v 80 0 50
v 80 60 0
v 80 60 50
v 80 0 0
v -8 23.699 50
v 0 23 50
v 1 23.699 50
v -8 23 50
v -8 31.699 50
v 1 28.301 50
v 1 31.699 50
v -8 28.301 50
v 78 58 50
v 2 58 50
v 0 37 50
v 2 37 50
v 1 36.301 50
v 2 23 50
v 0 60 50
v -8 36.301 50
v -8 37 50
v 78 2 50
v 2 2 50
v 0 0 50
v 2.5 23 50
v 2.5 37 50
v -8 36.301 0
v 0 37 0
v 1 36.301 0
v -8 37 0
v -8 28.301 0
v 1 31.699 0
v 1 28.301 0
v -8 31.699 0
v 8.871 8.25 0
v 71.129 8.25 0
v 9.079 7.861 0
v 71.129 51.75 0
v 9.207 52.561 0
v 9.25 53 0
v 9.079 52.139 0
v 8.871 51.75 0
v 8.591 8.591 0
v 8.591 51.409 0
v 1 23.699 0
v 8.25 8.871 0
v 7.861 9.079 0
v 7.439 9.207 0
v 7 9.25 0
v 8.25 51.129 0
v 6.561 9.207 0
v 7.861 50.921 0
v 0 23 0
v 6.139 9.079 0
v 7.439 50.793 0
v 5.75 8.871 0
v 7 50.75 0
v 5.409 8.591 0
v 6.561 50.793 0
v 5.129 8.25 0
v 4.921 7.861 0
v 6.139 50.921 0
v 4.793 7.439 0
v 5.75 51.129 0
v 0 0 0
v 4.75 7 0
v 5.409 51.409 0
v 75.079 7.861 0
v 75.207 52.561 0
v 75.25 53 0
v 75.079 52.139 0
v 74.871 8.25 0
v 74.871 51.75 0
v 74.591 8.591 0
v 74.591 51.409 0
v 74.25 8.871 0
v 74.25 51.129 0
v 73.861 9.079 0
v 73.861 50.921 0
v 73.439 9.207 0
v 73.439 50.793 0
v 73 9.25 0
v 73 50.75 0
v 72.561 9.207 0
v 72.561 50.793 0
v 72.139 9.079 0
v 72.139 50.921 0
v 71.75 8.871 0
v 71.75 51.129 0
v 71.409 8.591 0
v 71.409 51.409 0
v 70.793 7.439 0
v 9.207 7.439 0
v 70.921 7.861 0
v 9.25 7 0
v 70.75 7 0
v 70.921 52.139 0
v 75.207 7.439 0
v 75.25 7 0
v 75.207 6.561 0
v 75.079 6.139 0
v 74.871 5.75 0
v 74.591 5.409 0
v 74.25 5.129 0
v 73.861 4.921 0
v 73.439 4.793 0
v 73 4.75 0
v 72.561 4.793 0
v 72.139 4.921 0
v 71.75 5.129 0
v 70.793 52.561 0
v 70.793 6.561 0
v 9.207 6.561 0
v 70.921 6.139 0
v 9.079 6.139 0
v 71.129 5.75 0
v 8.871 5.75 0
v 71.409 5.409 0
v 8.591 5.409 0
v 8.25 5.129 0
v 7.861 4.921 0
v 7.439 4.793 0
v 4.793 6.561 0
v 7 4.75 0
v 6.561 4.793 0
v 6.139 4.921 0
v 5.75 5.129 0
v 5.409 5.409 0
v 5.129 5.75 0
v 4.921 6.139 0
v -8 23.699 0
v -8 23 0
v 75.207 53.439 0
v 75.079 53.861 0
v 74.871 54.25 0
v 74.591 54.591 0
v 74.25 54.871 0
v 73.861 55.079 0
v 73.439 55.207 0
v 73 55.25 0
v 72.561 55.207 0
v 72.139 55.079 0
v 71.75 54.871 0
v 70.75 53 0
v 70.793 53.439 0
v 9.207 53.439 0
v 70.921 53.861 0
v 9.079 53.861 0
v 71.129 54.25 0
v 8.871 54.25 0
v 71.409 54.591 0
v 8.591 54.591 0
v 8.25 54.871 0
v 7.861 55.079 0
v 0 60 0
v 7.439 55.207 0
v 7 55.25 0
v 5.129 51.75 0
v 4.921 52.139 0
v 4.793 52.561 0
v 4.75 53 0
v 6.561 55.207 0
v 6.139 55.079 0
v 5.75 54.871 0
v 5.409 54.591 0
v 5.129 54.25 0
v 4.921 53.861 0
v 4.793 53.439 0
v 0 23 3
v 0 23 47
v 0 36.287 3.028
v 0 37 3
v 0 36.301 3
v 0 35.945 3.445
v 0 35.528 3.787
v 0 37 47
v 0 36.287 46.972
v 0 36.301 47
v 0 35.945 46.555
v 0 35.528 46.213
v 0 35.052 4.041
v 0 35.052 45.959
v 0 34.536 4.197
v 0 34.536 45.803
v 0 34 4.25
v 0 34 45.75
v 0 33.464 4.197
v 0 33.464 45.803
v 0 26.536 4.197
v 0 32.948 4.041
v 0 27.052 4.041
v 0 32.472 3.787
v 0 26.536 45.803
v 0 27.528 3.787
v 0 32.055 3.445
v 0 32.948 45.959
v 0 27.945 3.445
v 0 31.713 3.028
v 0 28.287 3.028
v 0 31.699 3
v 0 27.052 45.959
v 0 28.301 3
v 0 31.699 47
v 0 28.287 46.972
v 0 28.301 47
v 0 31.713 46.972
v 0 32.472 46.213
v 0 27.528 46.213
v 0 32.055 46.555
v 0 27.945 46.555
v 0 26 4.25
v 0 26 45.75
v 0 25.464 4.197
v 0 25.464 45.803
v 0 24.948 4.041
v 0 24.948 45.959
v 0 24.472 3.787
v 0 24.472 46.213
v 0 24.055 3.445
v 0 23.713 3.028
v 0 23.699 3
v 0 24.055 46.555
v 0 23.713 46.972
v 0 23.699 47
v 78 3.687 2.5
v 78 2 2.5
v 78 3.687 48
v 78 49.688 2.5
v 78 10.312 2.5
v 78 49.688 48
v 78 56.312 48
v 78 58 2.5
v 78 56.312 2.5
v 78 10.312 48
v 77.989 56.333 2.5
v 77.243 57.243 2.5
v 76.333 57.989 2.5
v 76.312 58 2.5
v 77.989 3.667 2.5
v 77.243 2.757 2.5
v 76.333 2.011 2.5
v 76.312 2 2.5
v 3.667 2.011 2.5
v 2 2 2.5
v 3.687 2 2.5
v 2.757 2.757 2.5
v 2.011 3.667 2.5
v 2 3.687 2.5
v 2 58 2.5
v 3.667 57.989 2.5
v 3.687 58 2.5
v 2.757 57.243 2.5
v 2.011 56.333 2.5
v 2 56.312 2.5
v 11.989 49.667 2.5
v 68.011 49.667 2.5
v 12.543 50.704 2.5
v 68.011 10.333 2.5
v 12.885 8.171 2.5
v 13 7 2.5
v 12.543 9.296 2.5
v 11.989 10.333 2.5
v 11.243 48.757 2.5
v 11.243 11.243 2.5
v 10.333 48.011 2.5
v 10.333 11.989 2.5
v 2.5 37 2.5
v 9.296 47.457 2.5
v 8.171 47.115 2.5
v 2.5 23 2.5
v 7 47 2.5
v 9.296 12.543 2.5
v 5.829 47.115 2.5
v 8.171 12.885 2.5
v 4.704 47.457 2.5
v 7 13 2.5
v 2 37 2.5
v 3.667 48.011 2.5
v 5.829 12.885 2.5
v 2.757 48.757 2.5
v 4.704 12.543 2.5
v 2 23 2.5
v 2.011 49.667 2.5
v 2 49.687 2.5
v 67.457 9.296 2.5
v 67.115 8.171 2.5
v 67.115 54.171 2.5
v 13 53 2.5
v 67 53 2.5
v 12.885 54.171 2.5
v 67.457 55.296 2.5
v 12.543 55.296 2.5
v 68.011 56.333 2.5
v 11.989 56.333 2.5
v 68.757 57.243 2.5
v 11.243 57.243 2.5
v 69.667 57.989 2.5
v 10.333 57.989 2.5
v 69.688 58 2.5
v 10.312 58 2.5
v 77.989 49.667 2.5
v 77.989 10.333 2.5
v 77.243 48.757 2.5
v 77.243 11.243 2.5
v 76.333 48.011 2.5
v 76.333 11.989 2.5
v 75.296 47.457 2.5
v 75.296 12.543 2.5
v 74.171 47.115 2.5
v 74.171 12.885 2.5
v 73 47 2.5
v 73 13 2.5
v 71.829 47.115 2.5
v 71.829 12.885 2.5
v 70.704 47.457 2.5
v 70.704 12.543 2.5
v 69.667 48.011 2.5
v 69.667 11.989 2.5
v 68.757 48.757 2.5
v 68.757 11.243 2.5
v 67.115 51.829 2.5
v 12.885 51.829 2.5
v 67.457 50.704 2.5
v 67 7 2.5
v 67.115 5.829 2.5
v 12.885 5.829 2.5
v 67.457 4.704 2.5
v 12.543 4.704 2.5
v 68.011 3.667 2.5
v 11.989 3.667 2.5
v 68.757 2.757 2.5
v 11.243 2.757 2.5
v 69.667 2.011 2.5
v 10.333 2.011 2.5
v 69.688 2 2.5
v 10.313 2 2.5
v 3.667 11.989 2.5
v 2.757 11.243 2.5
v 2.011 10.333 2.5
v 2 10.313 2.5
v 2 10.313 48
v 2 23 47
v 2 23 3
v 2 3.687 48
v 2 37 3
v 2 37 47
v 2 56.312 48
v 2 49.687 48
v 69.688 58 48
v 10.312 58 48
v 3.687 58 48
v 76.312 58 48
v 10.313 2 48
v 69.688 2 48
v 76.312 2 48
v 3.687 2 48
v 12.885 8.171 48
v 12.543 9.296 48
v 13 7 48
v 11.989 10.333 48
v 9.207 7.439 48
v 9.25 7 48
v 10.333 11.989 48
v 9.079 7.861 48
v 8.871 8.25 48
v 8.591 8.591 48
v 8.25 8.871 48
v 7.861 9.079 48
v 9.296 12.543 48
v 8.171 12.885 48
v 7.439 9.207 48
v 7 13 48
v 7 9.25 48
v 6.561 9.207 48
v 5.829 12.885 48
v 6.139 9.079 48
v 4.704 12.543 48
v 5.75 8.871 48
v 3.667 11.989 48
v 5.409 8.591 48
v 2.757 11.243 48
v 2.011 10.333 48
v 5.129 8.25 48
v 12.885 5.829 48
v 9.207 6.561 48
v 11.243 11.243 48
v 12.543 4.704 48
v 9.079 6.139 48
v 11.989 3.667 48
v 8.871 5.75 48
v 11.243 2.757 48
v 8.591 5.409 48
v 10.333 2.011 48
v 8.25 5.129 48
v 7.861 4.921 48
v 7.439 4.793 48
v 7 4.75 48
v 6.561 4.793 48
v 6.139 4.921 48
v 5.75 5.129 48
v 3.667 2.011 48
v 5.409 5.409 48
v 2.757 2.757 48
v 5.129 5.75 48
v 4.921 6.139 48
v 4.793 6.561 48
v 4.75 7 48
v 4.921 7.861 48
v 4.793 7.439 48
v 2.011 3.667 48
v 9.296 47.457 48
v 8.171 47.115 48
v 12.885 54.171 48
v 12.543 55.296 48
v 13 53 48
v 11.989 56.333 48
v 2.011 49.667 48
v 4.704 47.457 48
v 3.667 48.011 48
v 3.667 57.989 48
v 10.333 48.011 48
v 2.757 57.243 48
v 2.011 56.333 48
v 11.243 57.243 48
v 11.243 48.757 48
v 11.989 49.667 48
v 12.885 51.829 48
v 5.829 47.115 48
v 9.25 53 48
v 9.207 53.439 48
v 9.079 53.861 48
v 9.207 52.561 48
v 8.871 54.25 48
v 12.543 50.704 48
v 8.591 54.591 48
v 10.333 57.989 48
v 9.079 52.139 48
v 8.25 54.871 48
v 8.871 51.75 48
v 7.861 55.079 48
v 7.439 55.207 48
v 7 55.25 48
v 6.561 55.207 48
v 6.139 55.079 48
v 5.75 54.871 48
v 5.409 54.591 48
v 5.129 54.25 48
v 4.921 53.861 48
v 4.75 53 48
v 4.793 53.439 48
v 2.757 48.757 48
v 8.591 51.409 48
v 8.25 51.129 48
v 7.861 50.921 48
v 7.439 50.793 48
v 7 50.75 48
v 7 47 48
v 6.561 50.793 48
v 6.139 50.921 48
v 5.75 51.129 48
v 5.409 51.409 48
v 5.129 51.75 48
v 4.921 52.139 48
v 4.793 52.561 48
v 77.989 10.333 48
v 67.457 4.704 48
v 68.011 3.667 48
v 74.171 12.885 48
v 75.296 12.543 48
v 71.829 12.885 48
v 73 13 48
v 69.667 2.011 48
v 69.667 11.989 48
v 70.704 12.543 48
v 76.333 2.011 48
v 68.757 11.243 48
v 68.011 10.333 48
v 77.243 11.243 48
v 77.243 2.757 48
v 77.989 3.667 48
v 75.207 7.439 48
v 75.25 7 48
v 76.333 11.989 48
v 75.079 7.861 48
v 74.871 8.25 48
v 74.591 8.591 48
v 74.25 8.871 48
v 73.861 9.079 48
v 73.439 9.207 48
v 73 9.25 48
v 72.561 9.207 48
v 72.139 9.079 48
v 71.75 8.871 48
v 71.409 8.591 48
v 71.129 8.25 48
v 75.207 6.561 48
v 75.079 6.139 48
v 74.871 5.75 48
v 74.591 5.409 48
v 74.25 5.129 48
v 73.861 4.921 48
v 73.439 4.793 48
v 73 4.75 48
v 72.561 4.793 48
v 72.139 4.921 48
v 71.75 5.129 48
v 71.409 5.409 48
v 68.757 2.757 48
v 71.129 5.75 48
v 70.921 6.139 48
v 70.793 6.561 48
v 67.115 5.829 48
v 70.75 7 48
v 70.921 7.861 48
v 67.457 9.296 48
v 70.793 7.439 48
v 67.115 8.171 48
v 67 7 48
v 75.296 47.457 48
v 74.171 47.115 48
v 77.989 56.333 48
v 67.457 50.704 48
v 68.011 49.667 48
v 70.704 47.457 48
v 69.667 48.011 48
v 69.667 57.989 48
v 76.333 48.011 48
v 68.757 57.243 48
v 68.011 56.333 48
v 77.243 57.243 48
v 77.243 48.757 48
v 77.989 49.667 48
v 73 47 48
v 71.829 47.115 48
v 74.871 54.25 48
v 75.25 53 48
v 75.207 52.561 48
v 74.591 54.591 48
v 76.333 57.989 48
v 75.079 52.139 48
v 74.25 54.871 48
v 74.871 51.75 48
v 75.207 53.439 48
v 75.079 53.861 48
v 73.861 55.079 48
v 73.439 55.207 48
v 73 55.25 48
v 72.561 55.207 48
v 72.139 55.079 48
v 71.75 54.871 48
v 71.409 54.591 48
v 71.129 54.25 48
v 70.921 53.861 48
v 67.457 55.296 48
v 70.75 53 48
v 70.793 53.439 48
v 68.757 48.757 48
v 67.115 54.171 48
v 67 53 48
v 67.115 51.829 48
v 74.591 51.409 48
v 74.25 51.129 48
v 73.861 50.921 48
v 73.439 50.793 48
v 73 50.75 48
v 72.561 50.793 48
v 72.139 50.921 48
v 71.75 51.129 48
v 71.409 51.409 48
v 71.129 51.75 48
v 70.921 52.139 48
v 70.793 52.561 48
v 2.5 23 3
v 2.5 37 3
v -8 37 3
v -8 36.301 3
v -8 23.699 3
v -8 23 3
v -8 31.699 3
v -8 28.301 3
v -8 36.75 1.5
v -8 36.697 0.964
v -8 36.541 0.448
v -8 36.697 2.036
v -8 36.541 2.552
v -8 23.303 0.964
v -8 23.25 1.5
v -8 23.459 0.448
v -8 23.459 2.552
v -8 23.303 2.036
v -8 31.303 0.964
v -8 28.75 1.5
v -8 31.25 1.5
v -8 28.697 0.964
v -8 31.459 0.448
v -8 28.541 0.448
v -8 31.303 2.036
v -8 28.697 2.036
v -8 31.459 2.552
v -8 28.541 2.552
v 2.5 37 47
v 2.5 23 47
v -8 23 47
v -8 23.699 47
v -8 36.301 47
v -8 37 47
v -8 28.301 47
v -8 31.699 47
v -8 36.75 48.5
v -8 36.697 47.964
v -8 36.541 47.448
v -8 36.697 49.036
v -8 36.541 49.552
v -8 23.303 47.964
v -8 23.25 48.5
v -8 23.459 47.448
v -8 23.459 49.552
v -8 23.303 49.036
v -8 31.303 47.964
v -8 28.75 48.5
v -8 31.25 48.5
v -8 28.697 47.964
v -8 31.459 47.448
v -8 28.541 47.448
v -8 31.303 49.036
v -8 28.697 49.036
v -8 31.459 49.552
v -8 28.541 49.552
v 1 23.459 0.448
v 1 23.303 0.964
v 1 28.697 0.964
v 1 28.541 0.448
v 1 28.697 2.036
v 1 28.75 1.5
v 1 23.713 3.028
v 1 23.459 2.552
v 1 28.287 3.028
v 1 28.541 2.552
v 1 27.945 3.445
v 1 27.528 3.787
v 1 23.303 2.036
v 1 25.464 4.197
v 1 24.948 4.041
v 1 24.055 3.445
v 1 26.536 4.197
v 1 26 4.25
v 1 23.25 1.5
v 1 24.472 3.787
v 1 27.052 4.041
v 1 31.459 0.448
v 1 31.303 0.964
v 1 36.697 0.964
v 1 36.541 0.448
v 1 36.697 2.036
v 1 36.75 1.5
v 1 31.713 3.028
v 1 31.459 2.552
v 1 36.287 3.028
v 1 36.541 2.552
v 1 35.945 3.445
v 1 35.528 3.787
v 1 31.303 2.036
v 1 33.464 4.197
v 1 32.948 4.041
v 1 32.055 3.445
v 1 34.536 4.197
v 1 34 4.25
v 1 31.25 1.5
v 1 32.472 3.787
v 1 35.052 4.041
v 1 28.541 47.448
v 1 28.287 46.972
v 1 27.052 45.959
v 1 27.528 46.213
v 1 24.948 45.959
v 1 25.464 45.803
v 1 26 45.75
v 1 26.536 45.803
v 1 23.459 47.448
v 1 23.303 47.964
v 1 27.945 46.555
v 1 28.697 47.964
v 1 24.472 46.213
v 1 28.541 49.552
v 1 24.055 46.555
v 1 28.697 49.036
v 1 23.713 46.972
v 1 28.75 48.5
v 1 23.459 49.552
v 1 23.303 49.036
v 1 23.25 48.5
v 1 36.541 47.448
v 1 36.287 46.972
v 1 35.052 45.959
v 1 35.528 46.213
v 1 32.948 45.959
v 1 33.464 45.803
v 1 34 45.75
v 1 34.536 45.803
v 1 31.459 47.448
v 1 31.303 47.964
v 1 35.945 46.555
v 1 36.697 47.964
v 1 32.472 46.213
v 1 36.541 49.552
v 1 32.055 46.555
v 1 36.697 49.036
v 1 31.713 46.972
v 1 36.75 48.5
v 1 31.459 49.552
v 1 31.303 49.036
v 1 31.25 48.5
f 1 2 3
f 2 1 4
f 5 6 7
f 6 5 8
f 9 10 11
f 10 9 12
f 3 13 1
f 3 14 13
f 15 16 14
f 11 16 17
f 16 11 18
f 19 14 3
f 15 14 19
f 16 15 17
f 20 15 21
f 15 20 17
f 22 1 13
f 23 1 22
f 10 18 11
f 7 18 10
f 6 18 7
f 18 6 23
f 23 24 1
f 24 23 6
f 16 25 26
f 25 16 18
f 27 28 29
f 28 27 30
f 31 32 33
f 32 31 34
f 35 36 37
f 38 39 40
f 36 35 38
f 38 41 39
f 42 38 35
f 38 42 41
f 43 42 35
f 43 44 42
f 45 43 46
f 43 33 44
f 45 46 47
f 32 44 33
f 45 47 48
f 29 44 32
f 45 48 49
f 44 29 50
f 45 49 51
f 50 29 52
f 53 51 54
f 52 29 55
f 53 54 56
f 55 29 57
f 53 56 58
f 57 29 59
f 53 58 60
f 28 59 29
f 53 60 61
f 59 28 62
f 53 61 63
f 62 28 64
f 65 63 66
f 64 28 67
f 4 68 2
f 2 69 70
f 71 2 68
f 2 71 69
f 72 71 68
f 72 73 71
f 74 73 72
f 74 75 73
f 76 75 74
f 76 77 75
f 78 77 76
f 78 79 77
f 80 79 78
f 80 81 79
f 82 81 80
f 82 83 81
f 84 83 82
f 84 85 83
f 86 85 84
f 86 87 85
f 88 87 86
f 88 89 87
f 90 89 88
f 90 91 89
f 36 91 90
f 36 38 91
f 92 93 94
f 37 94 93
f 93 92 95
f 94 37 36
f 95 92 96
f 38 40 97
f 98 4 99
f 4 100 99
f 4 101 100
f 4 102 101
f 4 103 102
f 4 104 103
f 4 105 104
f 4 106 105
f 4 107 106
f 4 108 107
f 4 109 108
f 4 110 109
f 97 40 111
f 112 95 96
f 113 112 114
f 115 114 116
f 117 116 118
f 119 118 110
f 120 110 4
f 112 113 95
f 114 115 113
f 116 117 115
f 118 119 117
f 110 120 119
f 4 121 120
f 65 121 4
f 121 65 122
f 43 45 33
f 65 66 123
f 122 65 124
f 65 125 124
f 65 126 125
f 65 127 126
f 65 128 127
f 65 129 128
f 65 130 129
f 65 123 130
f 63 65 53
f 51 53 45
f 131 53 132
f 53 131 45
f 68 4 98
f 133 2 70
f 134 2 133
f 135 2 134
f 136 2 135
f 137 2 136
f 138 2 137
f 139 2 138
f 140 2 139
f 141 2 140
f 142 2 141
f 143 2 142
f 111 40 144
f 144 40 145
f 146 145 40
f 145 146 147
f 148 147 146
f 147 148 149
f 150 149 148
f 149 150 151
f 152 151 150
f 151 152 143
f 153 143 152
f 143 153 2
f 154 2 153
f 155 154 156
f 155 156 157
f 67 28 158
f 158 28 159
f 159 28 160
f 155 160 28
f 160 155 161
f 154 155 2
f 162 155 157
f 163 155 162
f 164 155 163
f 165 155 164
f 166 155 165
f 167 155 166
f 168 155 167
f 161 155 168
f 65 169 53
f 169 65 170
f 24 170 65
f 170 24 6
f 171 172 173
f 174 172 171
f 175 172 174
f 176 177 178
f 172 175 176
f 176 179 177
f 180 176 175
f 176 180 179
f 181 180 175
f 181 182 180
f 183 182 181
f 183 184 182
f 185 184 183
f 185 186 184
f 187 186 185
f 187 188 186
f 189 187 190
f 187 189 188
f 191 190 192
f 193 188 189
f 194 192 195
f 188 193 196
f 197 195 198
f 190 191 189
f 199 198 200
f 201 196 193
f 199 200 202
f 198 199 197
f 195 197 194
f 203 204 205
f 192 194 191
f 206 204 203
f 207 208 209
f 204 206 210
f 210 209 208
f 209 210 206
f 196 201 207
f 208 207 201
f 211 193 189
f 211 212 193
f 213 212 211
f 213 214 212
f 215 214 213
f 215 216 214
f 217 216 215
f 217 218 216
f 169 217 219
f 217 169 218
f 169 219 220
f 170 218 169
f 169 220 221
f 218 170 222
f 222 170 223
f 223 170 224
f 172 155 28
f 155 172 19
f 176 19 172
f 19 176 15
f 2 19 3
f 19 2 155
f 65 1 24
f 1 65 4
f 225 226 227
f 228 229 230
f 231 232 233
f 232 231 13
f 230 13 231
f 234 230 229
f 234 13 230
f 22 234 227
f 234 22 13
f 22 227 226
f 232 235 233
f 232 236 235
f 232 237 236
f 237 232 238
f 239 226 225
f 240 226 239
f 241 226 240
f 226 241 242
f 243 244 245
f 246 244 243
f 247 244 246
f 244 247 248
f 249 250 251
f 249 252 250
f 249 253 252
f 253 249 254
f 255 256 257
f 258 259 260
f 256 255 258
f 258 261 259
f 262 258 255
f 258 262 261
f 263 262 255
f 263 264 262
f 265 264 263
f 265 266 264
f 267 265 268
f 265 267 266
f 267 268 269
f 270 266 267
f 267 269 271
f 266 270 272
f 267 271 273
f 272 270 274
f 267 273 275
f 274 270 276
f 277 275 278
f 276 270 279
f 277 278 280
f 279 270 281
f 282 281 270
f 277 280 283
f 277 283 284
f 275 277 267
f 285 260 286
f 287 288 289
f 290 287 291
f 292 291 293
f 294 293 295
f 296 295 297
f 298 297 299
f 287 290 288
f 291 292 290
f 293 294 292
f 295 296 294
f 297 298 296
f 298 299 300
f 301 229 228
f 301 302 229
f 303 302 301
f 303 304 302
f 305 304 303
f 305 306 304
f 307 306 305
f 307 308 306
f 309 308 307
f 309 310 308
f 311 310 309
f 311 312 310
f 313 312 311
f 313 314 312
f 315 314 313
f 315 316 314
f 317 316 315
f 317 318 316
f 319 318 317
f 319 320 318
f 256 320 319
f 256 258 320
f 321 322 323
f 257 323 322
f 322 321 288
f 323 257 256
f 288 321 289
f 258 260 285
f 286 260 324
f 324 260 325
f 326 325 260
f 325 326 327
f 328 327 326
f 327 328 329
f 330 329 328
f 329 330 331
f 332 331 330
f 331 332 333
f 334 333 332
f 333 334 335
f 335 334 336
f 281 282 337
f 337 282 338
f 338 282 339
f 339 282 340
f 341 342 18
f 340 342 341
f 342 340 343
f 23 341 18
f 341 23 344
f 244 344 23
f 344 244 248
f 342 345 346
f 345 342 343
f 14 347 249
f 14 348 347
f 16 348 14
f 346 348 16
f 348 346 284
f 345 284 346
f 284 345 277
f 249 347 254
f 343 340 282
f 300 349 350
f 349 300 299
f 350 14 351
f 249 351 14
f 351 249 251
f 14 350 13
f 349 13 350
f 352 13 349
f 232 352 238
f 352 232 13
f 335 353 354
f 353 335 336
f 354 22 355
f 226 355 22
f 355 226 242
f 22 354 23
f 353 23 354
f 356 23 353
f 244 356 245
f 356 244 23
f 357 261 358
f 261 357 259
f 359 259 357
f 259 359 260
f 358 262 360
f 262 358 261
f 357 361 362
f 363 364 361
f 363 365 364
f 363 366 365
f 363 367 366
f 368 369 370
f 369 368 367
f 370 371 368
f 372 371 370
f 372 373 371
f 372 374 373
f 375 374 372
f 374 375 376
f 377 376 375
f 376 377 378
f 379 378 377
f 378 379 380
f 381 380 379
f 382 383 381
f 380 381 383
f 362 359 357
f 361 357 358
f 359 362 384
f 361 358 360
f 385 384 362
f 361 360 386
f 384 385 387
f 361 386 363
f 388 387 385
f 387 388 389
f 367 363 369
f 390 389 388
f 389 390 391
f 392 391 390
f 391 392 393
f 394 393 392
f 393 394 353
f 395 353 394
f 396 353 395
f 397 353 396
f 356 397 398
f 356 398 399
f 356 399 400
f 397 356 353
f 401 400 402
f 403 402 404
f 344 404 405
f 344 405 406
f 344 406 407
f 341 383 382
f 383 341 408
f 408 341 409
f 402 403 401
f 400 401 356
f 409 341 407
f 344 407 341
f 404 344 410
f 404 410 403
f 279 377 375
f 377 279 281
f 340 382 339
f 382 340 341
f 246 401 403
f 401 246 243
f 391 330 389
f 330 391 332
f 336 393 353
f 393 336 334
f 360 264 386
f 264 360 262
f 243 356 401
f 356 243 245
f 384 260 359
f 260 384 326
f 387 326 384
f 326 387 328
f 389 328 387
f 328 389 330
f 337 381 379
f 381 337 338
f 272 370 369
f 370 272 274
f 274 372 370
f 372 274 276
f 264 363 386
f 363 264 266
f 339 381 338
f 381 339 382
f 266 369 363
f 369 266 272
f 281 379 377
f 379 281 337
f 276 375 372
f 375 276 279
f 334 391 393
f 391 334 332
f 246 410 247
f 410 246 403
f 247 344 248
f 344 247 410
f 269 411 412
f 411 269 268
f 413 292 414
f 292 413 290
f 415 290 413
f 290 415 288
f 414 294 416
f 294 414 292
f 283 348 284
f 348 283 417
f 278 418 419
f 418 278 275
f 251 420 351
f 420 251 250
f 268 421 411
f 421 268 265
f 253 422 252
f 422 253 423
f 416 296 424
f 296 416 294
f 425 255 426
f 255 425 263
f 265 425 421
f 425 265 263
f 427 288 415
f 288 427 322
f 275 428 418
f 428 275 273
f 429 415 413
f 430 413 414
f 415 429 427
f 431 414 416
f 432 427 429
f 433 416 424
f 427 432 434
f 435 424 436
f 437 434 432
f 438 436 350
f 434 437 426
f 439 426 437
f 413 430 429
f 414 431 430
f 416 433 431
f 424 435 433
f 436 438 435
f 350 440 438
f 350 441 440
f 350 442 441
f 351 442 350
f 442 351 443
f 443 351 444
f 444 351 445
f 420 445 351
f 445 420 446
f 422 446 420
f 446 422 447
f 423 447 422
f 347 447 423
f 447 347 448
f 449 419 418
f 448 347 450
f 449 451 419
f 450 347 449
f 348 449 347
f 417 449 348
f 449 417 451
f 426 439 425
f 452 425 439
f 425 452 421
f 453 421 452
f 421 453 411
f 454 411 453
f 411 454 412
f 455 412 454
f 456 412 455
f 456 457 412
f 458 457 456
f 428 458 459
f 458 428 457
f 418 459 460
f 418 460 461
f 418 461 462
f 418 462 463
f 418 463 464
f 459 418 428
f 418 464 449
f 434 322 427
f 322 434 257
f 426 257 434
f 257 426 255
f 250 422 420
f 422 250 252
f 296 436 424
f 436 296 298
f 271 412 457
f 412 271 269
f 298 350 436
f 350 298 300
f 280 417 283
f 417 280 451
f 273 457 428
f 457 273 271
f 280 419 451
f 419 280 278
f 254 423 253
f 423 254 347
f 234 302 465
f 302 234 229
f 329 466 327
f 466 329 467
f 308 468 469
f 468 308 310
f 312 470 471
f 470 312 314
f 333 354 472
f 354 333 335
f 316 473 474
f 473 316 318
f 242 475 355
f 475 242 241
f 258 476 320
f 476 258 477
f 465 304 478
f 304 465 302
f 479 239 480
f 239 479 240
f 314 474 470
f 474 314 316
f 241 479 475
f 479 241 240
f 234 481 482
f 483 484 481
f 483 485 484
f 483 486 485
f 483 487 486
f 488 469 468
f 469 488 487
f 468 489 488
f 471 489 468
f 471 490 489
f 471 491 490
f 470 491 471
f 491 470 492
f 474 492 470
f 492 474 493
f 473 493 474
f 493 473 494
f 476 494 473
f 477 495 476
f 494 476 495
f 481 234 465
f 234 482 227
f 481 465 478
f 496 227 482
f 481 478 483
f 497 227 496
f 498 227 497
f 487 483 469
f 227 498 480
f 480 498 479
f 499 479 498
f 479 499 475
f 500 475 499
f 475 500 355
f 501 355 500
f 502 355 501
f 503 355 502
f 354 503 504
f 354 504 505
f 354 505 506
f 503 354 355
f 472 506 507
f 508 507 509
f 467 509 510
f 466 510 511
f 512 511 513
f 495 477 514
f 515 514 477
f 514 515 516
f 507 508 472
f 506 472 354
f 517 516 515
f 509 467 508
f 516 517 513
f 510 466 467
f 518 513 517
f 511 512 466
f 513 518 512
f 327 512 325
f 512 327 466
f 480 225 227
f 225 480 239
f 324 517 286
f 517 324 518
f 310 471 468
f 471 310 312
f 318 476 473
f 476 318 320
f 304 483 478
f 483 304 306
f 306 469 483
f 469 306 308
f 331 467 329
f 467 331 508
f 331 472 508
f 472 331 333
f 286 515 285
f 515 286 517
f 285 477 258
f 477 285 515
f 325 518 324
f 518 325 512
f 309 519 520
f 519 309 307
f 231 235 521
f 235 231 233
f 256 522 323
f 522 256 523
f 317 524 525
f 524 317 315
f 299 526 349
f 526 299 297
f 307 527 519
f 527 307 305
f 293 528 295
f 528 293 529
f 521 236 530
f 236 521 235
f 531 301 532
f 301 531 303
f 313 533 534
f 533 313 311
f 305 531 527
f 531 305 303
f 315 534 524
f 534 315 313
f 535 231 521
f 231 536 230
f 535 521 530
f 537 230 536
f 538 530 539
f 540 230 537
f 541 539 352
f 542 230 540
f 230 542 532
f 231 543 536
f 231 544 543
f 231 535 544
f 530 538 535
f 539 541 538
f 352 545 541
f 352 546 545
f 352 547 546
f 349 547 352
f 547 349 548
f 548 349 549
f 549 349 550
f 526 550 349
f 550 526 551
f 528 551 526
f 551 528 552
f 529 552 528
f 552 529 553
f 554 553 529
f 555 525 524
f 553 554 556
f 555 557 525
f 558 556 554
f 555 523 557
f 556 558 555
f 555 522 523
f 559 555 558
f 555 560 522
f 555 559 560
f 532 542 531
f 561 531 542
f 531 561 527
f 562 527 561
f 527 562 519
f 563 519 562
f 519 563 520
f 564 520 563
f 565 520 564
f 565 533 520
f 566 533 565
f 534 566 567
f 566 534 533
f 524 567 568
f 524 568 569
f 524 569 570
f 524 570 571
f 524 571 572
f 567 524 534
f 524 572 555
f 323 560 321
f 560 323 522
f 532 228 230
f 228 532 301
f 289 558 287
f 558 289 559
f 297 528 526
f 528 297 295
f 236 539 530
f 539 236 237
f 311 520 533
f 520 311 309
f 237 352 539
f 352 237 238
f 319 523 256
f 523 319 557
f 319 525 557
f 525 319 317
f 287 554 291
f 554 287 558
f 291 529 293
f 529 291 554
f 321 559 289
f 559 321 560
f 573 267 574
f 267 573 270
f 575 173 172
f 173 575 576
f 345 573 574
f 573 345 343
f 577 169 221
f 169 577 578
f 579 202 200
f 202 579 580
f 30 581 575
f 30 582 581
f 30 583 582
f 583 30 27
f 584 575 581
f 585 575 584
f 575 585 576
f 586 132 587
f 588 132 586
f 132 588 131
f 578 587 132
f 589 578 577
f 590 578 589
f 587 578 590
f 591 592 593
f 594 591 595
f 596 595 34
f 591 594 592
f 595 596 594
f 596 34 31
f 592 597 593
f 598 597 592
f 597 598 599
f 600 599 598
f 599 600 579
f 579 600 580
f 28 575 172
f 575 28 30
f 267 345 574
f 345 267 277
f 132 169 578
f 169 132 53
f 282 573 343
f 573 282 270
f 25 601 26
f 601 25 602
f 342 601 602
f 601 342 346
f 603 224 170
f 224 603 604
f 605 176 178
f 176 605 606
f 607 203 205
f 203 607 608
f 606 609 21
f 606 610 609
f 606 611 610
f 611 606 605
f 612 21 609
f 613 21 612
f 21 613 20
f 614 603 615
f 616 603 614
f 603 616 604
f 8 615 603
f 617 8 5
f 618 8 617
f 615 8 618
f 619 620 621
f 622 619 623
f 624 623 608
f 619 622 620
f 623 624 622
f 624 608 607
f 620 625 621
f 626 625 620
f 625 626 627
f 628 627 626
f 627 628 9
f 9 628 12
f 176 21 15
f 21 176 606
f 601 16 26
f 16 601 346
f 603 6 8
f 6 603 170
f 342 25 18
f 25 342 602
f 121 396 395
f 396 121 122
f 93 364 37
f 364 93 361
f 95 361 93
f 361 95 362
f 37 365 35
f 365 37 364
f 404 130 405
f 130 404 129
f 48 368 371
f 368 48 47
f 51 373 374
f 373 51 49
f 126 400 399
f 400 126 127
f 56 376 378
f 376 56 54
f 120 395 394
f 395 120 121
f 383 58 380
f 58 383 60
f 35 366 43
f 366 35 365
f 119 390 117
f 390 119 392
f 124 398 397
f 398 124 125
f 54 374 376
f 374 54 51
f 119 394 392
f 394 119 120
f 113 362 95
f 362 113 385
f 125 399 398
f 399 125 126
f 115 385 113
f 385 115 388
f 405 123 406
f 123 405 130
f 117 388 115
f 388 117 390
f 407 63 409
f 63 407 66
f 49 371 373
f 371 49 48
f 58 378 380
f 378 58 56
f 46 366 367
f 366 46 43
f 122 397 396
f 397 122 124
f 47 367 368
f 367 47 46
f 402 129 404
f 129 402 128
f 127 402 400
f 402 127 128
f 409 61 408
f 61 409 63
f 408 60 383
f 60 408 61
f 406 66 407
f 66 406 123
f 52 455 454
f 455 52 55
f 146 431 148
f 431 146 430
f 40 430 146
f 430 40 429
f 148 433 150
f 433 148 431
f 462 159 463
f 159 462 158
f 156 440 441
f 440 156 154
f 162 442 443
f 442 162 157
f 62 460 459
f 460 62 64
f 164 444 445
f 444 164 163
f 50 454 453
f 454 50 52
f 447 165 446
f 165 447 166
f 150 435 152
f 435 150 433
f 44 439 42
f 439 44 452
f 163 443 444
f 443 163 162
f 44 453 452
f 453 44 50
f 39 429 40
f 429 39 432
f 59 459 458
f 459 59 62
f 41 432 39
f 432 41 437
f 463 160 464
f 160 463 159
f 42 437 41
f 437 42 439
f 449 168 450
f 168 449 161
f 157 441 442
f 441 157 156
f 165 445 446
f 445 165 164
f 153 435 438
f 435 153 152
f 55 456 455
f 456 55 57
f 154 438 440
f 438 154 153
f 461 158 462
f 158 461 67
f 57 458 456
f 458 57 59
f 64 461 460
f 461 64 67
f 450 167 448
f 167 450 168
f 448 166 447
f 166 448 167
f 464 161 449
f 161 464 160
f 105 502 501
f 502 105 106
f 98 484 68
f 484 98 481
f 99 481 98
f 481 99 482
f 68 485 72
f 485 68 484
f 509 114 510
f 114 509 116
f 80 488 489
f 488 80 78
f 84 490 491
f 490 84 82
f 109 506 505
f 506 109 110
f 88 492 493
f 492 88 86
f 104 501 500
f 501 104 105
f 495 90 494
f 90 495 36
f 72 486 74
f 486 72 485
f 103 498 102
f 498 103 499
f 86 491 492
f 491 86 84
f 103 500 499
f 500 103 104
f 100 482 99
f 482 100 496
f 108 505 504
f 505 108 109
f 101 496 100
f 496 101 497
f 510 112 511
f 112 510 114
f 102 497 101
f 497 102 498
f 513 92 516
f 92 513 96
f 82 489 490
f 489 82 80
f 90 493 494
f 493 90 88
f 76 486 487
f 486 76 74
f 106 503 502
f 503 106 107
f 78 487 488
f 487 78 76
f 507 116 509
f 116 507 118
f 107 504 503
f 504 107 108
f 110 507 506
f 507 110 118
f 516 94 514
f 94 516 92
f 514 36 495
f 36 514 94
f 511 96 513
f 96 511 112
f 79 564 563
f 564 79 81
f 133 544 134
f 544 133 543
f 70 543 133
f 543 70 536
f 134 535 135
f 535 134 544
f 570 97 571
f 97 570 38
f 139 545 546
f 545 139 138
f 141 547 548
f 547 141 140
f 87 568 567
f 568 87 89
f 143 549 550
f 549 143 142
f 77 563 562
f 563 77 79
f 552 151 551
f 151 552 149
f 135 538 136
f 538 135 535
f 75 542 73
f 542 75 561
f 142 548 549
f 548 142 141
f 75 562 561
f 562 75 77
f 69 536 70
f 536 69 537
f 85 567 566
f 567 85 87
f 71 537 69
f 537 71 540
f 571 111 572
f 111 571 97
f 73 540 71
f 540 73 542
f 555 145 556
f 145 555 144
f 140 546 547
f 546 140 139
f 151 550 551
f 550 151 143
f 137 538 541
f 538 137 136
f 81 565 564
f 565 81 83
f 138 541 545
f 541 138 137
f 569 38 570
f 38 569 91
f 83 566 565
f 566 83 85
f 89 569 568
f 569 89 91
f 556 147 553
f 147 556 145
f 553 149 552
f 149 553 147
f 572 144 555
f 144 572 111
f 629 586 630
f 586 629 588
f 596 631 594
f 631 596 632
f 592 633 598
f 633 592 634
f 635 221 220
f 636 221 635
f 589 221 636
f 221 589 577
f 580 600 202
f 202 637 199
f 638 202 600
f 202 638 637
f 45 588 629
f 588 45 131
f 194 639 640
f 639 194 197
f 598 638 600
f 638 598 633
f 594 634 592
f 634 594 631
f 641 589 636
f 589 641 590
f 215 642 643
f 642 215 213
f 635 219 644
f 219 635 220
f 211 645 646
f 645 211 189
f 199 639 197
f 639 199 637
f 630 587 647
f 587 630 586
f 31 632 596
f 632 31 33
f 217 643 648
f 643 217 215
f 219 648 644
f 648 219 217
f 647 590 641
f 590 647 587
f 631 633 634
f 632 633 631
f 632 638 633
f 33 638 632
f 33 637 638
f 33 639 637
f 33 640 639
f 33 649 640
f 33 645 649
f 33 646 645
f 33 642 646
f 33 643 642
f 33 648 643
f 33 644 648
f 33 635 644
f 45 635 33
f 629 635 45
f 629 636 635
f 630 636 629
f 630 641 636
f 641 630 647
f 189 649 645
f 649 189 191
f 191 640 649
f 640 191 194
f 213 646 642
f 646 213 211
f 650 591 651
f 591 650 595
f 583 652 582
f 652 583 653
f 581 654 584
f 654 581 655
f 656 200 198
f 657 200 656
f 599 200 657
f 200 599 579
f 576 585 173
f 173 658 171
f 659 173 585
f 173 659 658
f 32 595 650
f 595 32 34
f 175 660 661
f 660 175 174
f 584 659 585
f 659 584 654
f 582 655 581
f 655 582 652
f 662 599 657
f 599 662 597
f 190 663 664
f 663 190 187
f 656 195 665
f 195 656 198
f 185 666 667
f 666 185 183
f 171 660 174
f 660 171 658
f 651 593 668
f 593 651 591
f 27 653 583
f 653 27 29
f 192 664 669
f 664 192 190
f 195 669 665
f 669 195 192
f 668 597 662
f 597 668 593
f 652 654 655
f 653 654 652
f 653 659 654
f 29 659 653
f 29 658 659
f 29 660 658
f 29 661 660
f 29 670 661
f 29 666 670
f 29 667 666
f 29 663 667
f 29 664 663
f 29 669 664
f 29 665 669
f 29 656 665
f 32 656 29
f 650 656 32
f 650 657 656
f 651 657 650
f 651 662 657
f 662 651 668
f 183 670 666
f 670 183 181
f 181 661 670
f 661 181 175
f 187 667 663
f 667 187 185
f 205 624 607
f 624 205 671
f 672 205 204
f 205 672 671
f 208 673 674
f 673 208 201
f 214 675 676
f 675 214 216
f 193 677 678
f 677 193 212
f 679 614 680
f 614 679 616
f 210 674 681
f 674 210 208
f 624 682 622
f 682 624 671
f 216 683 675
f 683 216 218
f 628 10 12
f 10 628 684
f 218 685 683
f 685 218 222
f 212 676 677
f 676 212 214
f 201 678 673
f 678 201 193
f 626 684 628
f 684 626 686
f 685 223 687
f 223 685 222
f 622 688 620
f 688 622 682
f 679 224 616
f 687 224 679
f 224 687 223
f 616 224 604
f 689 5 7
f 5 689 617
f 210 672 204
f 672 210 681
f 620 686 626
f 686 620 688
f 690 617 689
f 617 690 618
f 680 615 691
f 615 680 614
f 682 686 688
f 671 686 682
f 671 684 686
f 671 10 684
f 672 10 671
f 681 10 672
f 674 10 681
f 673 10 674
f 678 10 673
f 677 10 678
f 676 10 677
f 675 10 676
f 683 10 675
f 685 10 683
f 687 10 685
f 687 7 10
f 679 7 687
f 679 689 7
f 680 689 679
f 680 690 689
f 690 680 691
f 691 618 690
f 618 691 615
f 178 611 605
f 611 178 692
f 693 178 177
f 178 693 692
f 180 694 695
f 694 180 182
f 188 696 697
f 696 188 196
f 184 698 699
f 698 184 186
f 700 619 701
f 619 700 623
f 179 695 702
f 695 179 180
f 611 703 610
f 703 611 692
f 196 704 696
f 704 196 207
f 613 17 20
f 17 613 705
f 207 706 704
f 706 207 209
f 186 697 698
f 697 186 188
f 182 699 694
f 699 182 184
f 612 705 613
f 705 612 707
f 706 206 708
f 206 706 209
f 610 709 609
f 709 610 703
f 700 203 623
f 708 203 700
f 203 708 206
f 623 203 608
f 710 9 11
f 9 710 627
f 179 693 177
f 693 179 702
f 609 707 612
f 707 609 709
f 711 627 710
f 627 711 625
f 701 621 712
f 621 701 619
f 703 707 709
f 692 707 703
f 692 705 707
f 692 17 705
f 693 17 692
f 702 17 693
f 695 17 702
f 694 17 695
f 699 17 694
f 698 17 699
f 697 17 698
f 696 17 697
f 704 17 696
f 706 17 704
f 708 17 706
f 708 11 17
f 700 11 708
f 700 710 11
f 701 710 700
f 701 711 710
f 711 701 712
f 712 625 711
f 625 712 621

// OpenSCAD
$fn = 32;

// ----------------------------------------------------------------------
// Enclosure body: 80 x 60 x 50 mm, wall 2 mm
// ----------------------------------------------------------------------

// --- parameters (mm) ---
length = 80;              // outside length, X
width = 60;               // outside width, Y
height = 50;              // outside height, Z
wall = 2;                 // side wall thickness
floor_t = 2.5;            // floor thickness
boss_d = 12;              // corner boss diameter
boss_h = 45.5;            // corner boss height above the floor
boss_hole_d = 4.5;        // lid screw clearance in the boss
boss_lip = 7;             // boss centre inset from the corner
ear_w = 14;               // mounting ear width
ear_t = 3;                // mounting ear thickness
ear_ext = 8;              // mounting ear reach
ear_hole_d = 5.5;         // mounting ear drills

module shell() {
  difference() {
    cube([length, width, height]);
    /* hollow, open at the top */
    translate([wall, wall, floor_t])
      cube([length - 2 * wall, width - 2 * wall, height]);
  }
}

module bosses() {
  /* corner bosses, sunk 1 mm into the floor */
  for (sx = [0, 1]) for (sy = [0, 1])
    translate([sx * (length - 2 * boss_lip) + boss_lip, sy * (width - 2 * boss_lip) + boss_lip, floor_t - 1])
      cylinder(h = boss_h + 1, d = boss_d);
}

module ears() {
  /* mounting ears on the short walls, sunk into the wall */
  for (sz = [0, 1])
    translate([-ear_ext, width / 2 - ear_w / 2, sz * (height - ear_t)])
      cube([ear_ext + 2.5, ear_w, ear_t]);
}

difference() {
  union() {
    shell();
    bosses();
    ears();
  }
  /* boss screw holes */
  for (sx = [0, 1]) for (sy = [0, 1])
    translate([sx * (length - 2 * boss_lip) + boss_lip, sy * (width - 2 * boss_lip) + boss_lip, -1]) cylinder(h = floor_t + boss_h + 2, d = boss_hole_d);
  for (sz = [0, 1]) for (sx = [0, 1]) translate([-ear_ext - 1, width / 2 + (2 * sx - 1) * (ear_w / 2 - 3), sz * (height - ear_t) + ear_t / 2]) rotate([0, 90, 0]) cylinder(h = ear_ext + 2, d = ear_hole_d);
}
